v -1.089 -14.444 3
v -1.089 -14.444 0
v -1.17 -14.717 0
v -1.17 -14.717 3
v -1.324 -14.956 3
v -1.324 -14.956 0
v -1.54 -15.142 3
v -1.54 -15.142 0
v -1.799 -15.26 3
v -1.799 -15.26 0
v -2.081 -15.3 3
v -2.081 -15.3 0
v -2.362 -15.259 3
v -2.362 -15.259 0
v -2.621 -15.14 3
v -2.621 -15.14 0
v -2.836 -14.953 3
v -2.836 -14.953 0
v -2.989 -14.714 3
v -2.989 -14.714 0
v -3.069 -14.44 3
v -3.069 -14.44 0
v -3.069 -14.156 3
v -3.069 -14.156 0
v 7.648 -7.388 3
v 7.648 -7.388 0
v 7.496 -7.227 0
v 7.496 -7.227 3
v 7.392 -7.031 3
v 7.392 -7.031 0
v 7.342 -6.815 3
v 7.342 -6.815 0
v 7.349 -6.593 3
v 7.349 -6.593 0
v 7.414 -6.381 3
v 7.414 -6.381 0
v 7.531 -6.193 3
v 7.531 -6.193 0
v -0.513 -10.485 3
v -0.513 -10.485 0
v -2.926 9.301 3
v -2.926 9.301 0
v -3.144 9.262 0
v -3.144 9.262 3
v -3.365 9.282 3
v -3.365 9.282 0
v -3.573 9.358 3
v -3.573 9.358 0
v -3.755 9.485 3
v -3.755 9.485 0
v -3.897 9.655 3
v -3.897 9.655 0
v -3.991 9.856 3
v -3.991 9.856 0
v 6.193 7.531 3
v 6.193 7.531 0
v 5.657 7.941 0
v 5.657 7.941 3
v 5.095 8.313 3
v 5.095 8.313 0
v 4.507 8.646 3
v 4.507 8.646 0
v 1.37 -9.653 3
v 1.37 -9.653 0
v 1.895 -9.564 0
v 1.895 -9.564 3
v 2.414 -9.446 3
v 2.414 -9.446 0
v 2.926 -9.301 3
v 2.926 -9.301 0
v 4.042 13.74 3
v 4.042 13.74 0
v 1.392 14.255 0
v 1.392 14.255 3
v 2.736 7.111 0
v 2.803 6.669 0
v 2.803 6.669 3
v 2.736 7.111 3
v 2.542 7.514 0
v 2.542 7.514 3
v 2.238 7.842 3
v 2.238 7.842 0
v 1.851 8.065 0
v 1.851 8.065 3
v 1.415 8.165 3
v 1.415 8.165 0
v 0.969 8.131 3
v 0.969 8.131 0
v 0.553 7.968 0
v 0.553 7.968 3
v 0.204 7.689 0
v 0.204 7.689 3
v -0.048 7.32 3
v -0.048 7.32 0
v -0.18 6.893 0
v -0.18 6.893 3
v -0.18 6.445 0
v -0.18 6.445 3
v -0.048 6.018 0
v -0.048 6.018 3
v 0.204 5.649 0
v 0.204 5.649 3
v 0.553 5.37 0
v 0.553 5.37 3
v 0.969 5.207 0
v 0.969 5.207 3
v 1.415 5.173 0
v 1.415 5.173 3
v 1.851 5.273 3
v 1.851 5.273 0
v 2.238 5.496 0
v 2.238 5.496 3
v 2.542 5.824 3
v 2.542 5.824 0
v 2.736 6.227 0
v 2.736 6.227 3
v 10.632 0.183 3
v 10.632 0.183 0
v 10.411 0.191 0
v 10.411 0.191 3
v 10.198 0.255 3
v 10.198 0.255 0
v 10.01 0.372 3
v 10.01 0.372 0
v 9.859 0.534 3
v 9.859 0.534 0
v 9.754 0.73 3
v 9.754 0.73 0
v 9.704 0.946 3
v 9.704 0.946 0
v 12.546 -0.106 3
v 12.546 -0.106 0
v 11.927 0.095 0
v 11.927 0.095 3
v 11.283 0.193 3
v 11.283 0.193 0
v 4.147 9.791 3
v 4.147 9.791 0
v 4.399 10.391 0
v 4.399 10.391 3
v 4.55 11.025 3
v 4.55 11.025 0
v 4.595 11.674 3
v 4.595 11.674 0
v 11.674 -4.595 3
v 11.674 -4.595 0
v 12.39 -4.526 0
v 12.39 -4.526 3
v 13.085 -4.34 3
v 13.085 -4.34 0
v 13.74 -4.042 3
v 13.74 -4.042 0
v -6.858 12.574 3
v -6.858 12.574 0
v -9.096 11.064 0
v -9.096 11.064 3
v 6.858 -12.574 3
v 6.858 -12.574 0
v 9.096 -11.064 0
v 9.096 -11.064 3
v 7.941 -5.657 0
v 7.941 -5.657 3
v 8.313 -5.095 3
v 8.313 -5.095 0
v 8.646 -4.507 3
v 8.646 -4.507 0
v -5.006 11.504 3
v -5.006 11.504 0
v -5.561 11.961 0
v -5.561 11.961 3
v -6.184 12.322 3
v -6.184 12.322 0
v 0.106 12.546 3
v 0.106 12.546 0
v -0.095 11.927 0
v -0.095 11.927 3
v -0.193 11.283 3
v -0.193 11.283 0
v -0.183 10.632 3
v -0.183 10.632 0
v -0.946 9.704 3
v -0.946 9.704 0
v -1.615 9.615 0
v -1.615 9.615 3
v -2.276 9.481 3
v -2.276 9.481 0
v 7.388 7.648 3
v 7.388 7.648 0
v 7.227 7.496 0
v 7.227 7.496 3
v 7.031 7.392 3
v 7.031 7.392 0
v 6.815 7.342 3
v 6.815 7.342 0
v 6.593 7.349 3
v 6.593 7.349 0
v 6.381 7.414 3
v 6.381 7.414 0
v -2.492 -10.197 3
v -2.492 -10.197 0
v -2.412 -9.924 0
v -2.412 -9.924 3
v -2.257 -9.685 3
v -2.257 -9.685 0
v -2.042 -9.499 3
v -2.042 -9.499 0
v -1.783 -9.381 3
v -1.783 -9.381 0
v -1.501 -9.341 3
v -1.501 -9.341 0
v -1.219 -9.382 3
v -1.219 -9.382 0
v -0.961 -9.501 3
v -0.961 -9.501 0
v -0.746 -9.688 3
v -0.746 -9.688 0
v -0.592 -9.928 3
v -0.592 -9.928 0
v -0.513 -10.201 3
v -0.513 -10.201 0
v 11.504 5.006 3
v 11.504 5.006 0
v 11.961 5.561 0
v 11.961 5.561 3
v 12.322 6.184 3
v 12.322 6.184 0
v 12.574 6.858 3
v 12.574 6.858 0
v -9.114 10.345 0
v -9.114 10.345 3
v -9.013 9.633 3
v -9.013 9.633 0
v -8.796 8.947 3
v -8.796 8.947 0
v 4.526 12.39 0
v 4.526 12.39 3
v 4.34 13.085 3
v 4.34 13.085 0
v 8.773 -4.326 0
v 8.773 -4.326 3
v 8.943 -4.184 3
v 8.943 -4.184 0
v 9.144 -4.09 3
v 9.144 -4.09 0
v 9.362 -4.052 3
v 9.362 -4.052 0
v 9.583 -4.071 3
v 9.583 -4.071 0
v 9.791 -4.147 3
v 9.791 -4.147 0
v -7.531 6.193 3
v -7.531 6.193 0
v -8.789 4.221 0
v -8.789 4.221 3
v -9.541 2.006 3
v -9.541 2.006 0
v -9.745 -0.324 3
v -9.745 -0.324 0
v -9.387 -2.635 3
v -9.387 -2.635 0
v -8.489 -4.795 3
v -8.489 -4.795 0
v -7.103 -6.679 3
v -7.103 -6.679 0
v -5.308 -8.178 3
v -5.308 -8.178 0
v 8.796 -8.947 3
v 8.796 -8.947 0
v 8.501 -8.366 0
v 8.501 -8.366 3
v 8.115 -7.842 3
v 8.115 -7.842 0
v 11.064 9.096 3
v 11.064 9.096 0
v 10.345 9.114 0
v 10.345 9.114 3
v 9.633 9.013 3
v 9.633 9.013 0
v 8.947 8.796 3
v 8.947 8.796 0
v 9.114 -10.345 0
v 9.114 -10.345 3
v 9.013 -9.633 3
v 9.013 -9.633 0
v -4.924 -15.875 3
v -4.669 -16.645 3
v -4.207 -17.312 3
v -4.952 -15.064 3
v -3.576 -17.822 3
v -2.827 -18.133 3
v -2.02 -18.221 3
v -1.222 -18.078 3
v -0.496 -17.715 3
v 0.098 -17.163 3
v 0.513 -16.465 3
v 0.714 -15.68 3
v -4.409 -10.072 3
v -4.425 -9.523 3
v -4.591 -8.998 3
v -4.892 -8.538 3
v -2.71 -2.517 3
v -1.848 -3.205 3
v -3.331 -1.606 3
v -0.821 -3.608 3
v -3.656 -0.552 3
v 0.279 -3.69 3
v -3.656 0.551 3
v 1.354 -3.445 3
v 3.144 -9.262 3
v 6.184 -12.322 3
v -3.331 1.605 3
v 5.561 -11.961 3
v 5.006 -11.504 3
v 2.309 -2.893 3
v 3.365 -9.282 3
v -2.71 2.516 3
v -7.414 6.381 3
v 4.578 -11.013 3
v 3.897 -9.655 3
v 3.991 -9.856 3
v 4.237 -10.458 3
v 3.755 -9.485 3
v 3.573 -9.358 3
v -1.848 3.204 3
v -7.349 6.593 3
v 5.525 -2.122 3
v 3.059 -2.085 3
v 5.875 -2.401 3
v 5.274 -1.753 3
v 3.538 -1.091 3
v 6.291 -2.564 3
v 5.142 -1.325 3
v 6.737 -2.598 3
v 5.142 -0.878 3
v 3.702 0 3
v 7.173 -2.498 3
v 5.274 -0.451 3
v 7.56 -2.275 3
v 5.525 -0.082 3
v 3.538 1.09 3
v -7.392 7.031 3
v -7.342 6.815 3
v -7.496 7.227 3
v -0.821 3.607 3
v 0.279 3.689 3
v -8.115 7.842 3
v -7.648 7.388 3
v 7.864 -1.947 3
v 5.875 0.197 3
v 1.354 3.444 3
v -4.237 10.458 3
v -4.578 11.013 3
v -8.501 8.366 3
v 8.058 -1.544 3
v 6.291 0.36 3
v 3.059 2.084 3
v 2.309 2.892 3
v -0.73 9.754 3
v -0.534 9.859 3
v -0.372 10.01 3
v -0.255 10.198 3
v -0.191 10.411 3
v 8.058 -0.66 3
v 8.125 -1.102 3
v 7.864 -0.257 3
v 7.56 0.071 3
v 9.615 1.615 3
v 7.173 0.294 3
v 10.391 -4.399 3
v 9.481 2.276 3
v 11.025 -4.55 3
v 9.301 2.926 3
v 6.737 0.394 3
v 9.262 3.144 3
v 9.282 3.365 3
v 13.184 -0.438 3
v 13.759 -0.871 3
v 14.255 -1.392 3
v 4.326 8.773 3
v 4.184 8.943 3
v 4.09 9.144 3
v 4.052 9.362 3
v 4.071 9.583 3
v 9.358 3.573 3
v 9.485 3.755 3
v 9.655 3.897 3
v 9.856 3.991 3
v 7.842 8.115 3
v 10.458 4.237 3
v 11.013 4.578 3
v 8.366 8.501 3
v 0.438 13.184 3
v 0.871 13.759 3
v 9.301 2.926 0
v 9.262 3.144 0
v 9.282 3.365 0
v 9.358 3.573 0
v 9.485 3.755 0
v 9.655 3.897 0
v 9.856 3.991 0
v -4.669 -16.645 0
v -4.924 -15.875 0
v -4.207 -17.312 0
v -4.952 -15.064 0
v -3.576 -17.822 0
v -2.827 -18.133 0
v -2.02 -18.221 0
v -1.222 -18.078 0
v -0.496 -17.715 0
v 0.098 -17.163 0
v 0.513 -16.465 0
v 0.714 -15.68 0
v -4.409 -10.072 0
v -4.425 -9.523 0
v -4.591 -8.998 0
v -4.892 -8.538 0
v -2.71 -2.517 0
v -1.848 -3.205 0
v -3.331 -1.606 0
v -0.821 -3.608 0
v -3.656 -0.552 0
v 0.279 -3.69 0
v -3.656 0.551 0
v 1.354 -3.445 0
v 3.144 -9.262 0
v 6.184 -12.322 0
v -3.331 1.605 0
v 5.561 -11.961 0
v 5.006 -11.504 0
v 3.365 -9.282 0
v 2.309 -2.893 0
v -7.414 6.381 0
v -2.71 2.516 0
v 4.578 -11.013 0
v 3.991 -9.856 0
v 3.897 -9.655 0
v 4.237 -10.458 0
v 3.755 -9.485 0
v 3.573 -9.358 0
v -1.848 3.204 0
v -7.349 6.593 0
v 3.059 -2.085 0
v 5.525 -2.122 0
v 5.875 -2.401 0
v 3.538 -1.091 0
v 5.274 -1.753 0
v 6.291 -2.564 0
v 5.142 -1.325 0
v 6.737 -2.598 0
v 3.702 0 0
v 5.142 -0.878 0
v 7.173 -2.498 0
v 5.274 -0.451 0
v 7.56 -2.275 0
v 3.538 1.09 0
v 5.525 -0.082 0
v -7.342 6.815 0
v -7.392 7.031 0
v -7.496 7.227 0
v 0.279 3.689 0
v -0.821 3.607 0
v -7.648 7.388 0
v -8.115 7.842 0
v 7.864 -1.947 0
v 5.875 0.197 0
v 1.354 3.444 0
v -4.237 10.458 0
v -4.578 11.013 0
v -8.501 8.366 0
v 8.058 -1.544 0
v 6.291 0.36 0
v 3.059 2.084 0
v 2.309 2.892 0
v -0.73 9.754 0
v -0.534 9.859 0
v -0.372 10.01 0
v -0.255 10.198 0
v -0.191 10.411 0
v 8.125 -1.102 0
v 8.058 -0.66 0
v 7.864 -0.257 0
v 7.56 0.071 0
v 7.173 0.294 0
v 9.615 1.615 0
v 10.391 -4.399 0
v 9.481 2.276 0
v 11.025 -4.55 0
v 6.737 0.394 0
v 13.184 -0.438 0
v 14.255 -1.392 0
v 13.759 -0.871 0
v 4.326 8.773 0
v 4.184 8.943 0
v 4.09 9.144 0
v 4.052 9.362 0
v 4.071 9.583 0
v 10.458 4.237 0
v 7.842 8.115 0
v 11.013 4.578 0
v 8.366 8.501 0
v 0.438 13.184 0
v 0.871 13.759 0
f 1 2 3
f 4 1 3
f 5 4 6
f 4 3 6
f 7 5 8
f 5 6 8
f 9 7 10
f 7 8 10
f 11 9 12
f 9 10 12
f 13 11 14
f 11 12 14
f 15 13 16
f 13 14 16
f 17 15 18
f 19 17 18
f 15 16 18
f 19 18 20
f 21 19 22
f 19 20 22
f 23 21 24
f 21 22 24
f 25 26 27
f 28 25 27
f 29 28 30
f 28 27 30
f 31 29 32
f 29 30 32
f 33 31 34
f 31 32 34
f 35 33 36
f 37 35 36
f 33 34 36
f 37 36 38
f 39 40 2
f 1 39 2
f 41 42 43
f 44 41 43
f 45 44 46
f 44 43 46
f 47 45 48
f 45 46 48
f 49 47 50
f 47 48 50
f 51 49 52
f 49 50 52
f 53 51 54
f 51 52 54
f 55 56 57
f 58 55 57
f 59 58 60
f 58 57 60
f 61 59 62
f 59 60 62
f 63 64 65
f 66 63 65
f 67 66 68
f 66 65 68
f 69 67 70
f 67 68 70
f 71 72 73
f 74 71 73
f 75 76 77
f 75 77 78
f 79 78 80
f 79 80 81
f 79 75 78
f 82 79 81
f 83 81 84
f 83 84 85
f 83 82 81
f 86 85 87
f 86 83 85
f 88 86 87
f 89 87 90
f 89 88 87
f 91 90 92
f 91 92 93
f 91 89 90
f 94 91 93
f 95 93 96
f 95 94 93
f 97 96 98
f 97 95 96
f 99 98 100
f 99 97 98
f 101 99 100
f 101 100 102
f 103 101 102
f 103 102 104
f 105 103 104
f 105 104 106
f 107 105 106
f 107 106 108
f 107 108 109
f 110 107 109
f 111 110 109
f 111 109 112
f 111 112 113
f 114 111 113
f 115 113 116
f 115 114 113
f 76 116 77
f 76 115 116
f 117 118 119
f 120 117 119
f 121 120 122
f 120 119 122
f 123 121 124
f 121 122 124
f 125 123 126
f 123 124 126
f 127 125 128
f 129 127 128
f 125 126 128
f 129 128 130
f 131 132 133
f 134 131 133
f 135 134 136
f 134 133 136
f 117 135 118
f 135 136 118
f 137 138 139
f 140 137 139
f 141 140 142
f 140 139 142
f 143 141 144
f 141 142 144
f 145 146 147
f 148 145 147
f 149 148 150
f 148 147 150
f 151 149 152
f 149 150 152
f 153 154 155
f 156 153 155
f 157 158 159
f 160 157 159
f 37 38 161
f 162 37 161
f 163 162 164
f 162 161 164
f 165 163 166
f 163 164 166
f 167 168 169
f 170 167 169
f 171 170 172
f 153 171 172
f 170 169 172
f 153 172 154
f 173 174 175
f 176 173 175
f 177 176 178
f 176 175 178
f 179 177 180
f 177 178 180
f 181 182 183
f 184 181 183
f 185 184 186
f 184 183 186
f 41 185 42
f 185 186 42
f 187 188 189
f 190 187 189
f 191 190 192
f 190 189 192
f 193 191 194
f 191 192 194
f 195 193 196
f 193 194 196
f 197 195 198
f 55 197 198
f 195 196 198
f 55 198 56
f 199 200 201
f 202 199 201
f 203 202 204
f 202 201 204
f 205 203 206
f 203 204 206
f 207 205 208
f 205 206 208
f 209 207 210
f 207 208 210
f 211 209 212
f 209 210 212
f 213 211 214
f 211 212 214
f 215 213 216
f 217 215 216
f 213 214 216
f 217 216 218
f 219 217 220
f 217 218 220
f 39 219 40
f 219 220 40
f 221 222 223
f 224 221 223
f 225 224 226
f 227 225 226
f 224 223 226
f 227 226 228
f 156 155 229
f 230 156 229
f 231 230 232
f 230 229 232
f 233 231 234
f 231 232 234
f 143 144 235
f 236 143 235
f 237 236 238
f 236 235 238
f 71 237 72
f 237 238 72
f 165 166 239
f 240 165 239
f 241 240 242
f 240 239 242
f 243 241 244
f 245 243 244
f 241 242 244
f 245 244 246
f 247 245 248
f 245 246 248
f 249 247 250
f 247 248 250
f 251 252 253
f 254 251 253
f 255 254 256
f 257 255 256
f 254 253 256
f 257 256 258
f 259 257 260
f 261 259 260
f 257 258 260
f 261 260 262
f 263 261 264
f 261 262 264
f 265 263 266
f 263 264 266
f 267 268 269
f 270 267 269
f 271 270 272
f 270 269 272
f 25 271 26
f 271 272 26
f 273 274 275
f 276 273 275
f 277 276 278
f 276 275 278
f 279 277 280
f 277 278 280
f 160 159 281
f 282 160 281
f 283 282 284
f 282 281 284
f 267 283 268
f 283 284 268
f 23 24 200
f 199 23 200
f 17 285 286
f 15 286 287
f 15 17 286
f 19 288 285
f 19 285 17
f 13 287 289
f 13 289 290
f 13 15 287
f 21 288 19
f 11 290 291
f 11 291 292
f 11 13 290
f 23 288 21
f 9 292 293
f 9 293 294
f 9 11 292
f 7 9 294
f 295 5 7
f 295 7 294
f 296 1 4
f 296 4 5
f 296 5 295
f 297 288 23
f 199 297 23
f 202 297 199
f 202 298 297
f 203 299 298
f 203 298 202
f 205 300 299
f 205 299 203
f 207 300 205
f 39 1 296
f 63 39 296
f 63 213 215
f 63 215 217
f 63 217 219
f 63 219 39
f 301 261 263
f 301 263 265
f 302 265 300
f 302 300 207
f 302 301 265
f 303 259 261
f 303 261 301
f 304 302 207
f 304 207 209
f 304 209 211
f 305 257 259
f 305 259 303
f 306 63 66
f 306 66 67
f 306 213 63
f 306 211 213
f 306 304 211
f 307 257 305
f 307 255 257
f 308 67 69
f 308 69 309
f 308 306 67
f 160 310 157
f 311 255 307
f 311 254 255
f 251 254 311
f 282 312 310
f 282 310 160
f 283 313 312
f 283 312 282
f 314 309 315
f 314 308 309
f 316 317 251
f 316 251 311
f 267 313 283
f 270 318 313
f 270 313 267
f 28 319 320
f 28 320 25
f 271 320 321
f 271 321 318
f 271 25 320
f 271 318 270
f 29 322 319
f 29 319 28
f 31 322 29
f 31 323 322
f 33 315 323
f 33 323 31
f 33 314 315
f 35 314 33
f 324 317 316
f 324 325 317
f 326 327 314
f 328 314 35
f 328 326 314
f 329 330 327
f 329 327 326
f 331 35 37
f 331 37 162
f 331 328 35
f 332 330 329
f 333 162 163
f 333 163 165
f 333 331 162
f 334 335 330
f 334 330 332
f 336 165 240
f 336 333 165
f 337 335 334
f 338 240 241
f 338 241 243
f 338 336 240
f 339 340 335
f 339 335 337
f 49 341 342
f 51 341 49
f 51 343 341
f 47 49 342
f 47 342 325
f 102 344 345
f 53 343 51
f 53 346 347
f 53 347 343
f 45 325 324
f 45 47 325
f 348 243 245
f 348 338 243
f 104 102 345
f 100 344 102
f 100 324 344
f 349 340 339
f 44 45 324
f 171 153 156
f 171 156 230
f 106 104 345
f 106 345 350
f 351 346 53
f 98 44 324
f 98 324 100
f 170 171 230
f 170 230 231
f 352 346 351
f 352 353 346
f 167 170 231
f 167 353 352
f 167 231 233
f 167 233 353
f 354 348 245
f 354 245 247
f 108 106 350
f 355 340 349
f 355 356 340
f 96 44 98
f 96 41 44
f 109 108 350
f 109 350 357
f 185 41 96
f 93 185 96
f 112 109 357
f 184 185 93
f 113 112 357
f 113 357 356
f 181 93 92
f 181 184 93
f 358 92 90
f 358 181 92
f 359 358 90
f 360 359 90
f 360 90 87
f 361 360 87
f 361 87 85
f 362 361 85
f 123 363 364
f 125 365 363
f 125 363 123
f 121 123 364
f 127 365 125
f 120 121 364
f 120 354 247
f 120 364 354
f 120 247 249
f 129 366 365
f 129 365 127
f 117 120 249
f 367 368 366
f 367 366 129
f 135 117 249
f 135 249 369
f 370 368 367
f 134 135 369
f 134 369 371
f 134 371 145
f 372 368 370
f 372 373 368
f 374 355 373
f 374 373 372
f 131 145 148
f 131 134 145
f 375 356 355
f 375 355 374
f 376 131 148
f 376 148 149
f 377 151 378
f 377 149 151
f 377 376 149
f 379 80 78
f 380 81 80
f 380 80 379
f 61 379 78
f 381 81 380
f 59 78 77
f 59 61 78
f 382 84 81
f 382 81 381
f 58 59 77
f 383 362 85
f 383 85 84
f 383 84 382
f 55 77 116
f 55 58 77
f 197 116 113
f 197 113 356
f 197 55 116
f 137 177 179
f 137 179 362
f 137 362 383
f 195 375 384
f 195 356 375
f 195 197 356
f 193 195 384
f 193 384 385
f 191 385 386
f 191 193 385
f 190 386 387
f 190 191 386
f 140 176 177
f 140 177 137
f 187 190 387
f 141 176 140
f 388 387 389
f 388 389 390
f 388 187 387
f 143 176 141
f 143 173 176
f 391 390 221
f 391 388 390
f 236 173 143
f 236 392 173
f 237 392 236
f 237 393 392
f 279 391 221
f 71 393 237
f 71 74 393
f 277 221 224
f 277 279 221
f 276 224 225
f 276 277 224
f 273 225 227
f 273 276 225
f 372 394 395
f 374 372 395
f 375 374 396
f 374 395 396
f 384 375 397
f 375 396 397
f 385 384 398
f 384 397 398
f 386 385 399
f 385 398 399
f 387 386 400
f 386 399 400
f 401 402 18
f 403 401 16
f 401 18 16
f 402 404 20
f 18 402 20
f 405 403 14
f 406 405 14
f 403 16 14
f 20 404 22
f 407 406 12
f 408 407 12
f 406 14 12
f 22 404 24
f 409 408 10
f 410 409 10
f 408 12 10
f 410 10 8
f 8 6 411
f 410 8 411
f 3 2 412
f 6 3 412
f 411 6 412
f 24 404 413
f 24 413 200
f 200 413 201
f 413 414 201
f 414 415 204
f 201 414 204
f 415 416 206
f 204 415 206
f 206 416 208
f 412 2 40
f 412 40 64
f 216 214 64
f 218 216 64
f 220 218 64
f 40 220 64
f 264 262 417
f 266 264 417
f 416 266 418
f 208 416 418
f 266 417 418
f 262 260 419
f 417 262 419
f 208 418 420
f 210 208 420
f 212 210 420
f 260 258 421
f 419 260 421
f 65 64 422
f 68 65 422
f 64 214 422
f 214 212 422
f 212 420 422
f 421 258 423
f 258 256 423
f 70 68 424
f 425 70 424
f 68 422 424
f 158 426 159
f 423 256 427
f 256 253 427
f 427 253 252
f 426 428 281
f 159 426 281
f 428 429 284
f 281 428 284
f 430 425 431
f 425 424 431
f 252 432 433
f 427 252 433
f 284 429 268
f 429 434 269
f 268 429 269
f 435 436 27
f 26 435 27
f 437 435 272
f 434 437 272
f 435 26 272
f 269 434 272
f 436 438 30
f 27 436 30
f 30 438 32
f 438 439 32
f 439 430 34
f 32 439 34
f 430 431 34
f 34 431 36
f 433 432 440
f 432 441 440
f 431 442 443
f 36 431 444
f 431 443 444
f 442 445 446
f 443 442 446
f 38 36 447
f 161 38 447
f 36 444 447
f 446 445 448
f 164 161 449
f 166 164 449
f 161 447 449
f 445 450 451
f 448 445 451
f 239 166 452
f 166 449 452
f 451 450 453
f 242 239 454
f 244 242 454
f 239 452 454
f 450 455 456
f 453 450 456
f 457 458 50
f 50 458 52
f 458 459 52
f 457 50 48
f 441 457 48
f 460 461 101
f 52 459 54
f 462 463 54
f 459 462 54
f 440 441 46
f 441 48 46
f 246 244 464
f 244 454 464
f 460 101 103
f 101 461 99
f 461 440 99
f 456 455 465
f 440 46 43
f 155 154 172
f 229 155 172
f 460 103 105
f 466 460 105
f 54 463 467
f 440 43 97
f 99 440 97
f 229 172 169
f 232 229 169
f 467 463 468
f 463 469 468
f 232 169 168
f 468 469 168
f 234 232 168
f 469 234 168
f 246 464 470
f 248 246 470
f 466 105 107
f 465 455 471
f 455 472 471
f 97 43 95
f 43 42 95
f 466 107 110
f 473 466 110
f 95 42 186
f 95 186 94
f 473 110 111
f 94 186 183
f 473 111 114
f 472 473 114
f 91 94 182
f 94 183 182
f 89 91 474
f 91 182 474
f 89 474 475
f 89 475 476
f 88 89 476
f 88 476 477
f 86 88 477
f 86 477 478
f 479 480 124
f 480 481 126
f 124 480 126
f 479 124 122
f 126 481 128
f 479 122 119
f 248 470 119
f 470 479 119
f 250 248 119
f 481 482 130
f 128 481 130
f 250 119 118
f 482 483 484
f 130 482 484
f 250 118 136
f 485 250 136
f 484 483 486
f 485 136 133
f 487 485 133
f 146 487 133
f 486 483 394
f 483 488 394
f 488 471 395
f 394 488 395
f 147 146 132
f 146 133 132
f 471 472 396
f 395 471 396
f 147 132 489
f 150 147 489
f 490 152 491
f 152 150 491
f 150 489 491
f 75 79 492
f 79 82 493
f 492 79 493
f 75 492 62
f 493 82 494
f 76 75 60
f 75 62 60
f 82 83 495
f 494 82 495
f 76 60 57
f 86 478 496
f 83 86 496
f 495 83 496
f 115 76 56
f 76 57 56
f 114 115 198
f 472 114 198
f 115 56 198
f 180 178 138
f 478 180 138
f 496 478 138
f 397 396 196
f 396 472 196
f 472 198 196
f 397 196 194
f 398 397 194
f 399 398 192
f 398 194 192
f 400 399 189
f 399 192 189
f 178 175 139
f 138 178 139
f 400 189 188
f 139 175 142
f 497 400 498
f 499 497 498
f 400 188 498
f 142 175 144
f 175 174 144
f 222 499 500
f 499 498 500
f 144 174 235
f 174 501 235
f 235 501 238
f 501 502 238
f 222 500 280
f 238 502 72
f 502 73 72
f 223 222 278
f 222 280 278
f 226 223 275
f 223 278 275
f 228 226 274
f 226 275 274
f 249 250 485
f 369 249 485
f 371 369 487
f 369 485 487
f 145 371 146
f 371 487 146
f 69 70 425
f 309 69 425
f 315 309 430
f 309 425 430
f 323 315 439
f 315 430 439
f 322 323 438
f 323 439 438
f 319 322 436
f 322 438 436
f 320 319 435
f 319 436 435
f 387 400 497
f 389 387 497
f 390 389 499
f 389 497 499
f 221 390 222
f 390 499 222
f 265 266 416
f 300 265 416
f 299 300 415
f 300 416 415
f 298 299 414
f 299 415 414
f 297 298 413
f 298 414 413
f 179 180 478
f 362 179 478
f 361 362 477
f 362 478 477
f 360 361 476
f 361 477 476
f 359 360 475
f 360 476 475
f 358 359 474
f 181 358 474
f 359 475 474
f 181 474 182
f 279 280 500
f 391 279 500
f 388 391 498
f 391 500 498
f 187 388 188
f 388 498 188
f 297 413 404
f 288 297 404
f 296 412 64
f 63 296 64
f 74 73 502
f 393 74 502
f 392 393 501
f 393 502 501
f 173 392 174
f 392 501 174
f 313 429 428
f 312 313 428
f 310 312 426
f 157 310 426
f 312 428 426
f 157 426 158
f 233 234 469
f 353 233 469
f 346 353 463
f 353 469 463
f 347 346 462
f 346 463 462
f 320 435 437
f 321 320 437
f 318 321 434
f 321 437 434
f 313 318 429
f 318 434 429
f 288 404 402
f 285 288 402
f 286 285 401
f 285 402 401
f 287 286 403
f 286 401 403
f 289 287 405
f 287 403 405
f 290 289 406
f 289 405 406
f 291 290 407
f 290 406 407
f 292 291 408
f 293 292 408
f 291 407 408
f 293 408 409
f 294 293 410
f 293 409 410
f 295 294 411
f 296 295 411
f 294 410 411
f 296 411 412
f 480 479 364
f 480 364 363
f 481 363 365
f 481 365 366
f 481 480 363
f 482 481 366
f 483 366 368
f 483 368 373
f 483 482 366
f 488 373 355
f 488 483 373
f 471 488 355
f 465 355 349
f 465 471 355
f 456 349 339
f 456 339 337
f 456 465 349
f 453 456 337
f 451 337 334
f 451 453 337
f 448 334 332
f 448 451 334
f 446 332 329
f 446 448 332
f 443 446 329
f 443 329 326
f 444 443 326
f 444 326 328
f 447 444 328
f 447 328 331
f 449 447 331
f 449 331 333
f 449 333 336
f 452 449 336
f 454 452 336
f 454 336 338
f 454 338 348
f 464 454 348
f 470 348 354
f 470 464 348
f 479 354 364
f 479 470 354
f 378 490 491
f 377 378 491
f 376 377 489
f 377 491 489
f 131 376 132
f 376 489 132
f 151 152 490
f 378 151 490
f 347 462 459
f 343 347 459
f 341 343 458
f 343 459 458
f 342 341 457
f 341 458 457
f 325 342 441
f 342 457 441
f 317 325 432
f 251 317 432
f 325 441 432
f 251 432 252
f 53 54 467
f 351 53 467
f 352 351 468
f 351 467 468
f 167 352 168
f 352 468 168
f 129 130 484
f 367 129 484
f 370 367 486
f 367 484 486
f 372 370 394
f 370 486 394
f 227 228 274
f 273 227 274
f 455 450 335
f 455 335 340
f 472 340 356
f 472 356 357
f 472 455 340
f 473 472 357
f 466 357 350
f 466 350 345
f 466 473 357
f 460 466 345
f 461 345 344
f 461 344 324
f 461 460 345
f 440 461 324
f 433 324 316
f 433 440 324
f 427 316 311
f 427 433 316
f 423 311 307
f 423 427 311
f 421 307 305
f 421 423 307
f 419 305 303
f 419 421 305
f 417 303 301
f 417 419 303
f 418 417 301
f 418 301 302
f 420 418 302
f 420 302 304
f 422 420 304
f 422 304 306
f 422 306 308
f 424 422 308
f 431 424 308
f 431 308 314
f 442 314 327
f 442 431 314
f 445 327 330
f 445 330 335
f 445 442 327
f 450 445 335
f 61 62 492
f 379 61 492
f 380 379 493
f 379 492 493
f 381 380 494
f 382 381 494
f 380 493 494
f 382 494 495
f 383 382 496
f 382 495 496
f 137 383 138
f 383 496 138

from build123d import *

# Parameters (mm, degrees)
SKETCH1_R           = 1.5
SKETCH1_R_2         = 3.7
BOSS_EXTRUDE1_DEPTH = 3


with BuildPart() as part:
    # Sketch1 → Boss-Extrude1 (new body)
    with BuildSketch(Plane.XY):
        with BuildLine():
            Line((13.740457451, -4.042470891), (14.255332257, -1.392017357))
            ThreePointArc((14.255332257, -1.392017357), (13.480746798, -0.642737861), (12.546028185, -0.106357853))
            ThreePointArc((12.546028185, -0.106357853), (11.607127827, 0.157211053), (10.632288023, 0.1834752))
            ThreePointArc((10.632288023, 0.1834752), (10.010207796, 0.372487454), (9.703996042, 0.94602368))
            ThreePointArc((9.703996042, 0.94602368), (9.553721125, 1.946512948), (9.300578942, 2.926043632))
            ThreePointArc((9.300578942, 2.926043632), (9.357660457, 3.573428685), (9.855662757, 3.990992351))
            ThreePointArc((9.855662757, 3.990992351), (10.742650685, 4.396276035), (11.503786091, 5.005927856))
            ThreePointArc((11.503786091, 5.005927856), (12.154418131, 5.865043883), (12.57442922, 6.85751206))
            Line((12.57442922, 6.85751206), (11.06434702, 9.095737194))
            ThreePointArc((11.06434702, 9.095737194), (9.986811776, 9.077843176), (8.946587965, 8.796175247))
            ThreePointArc((8.946587965, 8.796175247), (8.096313795, 8.318643798), (7.388426402, 7.647899519))
            ThreePointArc((7.388426402, 7.647899519), (6.814897409, 7.341674219), (6.192821647, 7.530701165))
            ThreePointArc((6.192821647, 7.530701165), (5.379108488, 8.131893498), (4.507477145, 8.645527732))
            ThreePointArc((4.507477145, 8.645527732), (4.09006951, 9.14366082), (4.146948213, 9.791063724))
            ThreePointArc((4.146948213, 9.791063724), (4.487564551, 10.704837744), (4.594679622, 11.674130687))
            ThreePointArc((4.594679622, 11.674130687), (4.447259181, 12.741683783), (4.042470891, 13.740457451))
            Line((4.042470891, 13.740457451), (1.392017357, 14.255332257))
            ThreePointArc((1.392017357, 14.255332257), (0.642737861, 13.480746798), (0.106357853, 12.546028185))
            ThreePointArc((0.106357853, 12.546028185), (-0.157211053, 11.607127827), (-0.1834752, 10.632288023))
            ThreePointArc((-0.1834752, 10.632288023), (-0.372487454, 10.010207796), (-0.94602368, 9.703996042))
            ThreePointArc((-0.94602368, 9.703996042), (-1.946512948, 9.553721125), (-2.926043632, 9.300578942))
            ThreePointArc((-2.926043632, 9.300578942), (-3.573428685, 9.357660457), (-3.990992351, 9.855662757))
            ThreePointArc((-3.990992351, 9.855662757), (-4.396276035, 10.742650685), (-5.005927856, 11.503786091))
            ThreePointArc((-5.005927856, 11.503786091), (-5.865043883, 12.154418131), (-6.85751206, 12.57442922))
            Line((-6.85751206, 12.57442922), (-9.095737194, 11.06434702))
            ThreePointArc((-9.095737194, 11.06434702), (-9.077843176, 9.986811776), (-8.796175247, 8.946587965))
            ThreePointArc((-8.796175247, 8.946587965), (-8.318643798, 8.096313795), (-7.647899519, 7.388426402))
            ThreePointArc((-7.647899519, 7.388426402), (-7.341674219, 6.814897409), (-7.530701165, 6.192821647))
            ThreePointArc((-7.530701165, 6.192821647), (-9.635448804, -1.490176611), (-5.308108038, -8.178416047))
            ThreePointArc((-5.308108038, -8.178416047), (-4.590564776, -8.998081228), (-4.409043882, -10.072217861))
            Line((-4.409043882, -10.072217861), (-4.952379844, -15.064191543))
            ThreePointArc((-4.952379844, -15.064191543), (-2.426769985, -18.205915305), (0.714311062, -15.679506151))
            Line((0.714311062, -15.679506151), (1.370494976, -9.653198615))
            ThreePointArc((1.370494976, -9.653198615), (2.155492092, -9.508751433), (2.926043632, -9.300578942))
            ThreePointArc((2.926043632, -9.300578942), (3.573428685, -9.357660457), (3.990992351, -9.855662757))
            ThreePointArc((3.990992351, -9.855662757), (4.396276035, -10.742650685), (5.005927856, -11.503786091))
            ThreePointArc((5.005927856, -11.503786091), (5.865043883, -12.154418131), (6.85751206, -12.57442922))
            Line((6.85751206, -12.57442922), (9.095737194, -11.06434702))
            ThreePointArc((9.095737194, -11.06434702), (9.077843176, -9.986811776), (8.796175247, -8.946587965))
            ThreePointArc((8.796175247, -8.946587965), (8.318643798, -8.096313795), (7.647899519, -7.388426402))
            ThreePointArc((7.647899519, -7.388426402), (7.341674219, -6.814897409), (7.530701165, -6.192821647))
            ThreePointArc((7.530701165, -6.192821647), (8.131893498, -5.379108488), (8.645527732, -4.507477145))
            ThreePointArc((8.645527732, -4.507477145), (9.14366082, -4.09006951), (9.791063724, -4.146948213))
            ThreePointArc((9.791063724, -4.146948213), (10.704837744, -4.487564551), (11.674130687, -4.594679622))
            ThreePointArc((11.674130687, -4.594679622), (12.741683783, -4.447259181), (13.740457451, -4.042470891))
        make_face()
        with Locations((6.625050503, -1.101923166)):
            Circle(SKETCH1_R, mode=Mode.SUBTRACT)
        with Locations((0.002221487, -0.000323095)):
            Circle(SKETCH1_R_2, mode=Mode.SUBTRACT)
        with Locations((1.303084957, 6.668993396)):
            Circle(SKETCH1_R, mode=Mode.SUBTRACT)
        with BuildLine():
            Line((-3.068510764, -14.155643998), (-2.492411625, -10.197347675))
            ThreePointArc((-2.492411625, -10.197347675), (-1.35881276, -9.351798379), (-0.513263464, -10.485397245))
            Line((-0.513263464, -10.485397245), (-1.089362603, -14.443693568))
            ThreePointArc((-1.089362603, -14.443693568), (-2.222961468, -15.289242864), (-3.068510764, -14.155643998))
        make_face(mode=Mode.SUBTRACT)
    extrude(amount=BOSS_EXTRUDE1_DEPTH)


solid = part.part
